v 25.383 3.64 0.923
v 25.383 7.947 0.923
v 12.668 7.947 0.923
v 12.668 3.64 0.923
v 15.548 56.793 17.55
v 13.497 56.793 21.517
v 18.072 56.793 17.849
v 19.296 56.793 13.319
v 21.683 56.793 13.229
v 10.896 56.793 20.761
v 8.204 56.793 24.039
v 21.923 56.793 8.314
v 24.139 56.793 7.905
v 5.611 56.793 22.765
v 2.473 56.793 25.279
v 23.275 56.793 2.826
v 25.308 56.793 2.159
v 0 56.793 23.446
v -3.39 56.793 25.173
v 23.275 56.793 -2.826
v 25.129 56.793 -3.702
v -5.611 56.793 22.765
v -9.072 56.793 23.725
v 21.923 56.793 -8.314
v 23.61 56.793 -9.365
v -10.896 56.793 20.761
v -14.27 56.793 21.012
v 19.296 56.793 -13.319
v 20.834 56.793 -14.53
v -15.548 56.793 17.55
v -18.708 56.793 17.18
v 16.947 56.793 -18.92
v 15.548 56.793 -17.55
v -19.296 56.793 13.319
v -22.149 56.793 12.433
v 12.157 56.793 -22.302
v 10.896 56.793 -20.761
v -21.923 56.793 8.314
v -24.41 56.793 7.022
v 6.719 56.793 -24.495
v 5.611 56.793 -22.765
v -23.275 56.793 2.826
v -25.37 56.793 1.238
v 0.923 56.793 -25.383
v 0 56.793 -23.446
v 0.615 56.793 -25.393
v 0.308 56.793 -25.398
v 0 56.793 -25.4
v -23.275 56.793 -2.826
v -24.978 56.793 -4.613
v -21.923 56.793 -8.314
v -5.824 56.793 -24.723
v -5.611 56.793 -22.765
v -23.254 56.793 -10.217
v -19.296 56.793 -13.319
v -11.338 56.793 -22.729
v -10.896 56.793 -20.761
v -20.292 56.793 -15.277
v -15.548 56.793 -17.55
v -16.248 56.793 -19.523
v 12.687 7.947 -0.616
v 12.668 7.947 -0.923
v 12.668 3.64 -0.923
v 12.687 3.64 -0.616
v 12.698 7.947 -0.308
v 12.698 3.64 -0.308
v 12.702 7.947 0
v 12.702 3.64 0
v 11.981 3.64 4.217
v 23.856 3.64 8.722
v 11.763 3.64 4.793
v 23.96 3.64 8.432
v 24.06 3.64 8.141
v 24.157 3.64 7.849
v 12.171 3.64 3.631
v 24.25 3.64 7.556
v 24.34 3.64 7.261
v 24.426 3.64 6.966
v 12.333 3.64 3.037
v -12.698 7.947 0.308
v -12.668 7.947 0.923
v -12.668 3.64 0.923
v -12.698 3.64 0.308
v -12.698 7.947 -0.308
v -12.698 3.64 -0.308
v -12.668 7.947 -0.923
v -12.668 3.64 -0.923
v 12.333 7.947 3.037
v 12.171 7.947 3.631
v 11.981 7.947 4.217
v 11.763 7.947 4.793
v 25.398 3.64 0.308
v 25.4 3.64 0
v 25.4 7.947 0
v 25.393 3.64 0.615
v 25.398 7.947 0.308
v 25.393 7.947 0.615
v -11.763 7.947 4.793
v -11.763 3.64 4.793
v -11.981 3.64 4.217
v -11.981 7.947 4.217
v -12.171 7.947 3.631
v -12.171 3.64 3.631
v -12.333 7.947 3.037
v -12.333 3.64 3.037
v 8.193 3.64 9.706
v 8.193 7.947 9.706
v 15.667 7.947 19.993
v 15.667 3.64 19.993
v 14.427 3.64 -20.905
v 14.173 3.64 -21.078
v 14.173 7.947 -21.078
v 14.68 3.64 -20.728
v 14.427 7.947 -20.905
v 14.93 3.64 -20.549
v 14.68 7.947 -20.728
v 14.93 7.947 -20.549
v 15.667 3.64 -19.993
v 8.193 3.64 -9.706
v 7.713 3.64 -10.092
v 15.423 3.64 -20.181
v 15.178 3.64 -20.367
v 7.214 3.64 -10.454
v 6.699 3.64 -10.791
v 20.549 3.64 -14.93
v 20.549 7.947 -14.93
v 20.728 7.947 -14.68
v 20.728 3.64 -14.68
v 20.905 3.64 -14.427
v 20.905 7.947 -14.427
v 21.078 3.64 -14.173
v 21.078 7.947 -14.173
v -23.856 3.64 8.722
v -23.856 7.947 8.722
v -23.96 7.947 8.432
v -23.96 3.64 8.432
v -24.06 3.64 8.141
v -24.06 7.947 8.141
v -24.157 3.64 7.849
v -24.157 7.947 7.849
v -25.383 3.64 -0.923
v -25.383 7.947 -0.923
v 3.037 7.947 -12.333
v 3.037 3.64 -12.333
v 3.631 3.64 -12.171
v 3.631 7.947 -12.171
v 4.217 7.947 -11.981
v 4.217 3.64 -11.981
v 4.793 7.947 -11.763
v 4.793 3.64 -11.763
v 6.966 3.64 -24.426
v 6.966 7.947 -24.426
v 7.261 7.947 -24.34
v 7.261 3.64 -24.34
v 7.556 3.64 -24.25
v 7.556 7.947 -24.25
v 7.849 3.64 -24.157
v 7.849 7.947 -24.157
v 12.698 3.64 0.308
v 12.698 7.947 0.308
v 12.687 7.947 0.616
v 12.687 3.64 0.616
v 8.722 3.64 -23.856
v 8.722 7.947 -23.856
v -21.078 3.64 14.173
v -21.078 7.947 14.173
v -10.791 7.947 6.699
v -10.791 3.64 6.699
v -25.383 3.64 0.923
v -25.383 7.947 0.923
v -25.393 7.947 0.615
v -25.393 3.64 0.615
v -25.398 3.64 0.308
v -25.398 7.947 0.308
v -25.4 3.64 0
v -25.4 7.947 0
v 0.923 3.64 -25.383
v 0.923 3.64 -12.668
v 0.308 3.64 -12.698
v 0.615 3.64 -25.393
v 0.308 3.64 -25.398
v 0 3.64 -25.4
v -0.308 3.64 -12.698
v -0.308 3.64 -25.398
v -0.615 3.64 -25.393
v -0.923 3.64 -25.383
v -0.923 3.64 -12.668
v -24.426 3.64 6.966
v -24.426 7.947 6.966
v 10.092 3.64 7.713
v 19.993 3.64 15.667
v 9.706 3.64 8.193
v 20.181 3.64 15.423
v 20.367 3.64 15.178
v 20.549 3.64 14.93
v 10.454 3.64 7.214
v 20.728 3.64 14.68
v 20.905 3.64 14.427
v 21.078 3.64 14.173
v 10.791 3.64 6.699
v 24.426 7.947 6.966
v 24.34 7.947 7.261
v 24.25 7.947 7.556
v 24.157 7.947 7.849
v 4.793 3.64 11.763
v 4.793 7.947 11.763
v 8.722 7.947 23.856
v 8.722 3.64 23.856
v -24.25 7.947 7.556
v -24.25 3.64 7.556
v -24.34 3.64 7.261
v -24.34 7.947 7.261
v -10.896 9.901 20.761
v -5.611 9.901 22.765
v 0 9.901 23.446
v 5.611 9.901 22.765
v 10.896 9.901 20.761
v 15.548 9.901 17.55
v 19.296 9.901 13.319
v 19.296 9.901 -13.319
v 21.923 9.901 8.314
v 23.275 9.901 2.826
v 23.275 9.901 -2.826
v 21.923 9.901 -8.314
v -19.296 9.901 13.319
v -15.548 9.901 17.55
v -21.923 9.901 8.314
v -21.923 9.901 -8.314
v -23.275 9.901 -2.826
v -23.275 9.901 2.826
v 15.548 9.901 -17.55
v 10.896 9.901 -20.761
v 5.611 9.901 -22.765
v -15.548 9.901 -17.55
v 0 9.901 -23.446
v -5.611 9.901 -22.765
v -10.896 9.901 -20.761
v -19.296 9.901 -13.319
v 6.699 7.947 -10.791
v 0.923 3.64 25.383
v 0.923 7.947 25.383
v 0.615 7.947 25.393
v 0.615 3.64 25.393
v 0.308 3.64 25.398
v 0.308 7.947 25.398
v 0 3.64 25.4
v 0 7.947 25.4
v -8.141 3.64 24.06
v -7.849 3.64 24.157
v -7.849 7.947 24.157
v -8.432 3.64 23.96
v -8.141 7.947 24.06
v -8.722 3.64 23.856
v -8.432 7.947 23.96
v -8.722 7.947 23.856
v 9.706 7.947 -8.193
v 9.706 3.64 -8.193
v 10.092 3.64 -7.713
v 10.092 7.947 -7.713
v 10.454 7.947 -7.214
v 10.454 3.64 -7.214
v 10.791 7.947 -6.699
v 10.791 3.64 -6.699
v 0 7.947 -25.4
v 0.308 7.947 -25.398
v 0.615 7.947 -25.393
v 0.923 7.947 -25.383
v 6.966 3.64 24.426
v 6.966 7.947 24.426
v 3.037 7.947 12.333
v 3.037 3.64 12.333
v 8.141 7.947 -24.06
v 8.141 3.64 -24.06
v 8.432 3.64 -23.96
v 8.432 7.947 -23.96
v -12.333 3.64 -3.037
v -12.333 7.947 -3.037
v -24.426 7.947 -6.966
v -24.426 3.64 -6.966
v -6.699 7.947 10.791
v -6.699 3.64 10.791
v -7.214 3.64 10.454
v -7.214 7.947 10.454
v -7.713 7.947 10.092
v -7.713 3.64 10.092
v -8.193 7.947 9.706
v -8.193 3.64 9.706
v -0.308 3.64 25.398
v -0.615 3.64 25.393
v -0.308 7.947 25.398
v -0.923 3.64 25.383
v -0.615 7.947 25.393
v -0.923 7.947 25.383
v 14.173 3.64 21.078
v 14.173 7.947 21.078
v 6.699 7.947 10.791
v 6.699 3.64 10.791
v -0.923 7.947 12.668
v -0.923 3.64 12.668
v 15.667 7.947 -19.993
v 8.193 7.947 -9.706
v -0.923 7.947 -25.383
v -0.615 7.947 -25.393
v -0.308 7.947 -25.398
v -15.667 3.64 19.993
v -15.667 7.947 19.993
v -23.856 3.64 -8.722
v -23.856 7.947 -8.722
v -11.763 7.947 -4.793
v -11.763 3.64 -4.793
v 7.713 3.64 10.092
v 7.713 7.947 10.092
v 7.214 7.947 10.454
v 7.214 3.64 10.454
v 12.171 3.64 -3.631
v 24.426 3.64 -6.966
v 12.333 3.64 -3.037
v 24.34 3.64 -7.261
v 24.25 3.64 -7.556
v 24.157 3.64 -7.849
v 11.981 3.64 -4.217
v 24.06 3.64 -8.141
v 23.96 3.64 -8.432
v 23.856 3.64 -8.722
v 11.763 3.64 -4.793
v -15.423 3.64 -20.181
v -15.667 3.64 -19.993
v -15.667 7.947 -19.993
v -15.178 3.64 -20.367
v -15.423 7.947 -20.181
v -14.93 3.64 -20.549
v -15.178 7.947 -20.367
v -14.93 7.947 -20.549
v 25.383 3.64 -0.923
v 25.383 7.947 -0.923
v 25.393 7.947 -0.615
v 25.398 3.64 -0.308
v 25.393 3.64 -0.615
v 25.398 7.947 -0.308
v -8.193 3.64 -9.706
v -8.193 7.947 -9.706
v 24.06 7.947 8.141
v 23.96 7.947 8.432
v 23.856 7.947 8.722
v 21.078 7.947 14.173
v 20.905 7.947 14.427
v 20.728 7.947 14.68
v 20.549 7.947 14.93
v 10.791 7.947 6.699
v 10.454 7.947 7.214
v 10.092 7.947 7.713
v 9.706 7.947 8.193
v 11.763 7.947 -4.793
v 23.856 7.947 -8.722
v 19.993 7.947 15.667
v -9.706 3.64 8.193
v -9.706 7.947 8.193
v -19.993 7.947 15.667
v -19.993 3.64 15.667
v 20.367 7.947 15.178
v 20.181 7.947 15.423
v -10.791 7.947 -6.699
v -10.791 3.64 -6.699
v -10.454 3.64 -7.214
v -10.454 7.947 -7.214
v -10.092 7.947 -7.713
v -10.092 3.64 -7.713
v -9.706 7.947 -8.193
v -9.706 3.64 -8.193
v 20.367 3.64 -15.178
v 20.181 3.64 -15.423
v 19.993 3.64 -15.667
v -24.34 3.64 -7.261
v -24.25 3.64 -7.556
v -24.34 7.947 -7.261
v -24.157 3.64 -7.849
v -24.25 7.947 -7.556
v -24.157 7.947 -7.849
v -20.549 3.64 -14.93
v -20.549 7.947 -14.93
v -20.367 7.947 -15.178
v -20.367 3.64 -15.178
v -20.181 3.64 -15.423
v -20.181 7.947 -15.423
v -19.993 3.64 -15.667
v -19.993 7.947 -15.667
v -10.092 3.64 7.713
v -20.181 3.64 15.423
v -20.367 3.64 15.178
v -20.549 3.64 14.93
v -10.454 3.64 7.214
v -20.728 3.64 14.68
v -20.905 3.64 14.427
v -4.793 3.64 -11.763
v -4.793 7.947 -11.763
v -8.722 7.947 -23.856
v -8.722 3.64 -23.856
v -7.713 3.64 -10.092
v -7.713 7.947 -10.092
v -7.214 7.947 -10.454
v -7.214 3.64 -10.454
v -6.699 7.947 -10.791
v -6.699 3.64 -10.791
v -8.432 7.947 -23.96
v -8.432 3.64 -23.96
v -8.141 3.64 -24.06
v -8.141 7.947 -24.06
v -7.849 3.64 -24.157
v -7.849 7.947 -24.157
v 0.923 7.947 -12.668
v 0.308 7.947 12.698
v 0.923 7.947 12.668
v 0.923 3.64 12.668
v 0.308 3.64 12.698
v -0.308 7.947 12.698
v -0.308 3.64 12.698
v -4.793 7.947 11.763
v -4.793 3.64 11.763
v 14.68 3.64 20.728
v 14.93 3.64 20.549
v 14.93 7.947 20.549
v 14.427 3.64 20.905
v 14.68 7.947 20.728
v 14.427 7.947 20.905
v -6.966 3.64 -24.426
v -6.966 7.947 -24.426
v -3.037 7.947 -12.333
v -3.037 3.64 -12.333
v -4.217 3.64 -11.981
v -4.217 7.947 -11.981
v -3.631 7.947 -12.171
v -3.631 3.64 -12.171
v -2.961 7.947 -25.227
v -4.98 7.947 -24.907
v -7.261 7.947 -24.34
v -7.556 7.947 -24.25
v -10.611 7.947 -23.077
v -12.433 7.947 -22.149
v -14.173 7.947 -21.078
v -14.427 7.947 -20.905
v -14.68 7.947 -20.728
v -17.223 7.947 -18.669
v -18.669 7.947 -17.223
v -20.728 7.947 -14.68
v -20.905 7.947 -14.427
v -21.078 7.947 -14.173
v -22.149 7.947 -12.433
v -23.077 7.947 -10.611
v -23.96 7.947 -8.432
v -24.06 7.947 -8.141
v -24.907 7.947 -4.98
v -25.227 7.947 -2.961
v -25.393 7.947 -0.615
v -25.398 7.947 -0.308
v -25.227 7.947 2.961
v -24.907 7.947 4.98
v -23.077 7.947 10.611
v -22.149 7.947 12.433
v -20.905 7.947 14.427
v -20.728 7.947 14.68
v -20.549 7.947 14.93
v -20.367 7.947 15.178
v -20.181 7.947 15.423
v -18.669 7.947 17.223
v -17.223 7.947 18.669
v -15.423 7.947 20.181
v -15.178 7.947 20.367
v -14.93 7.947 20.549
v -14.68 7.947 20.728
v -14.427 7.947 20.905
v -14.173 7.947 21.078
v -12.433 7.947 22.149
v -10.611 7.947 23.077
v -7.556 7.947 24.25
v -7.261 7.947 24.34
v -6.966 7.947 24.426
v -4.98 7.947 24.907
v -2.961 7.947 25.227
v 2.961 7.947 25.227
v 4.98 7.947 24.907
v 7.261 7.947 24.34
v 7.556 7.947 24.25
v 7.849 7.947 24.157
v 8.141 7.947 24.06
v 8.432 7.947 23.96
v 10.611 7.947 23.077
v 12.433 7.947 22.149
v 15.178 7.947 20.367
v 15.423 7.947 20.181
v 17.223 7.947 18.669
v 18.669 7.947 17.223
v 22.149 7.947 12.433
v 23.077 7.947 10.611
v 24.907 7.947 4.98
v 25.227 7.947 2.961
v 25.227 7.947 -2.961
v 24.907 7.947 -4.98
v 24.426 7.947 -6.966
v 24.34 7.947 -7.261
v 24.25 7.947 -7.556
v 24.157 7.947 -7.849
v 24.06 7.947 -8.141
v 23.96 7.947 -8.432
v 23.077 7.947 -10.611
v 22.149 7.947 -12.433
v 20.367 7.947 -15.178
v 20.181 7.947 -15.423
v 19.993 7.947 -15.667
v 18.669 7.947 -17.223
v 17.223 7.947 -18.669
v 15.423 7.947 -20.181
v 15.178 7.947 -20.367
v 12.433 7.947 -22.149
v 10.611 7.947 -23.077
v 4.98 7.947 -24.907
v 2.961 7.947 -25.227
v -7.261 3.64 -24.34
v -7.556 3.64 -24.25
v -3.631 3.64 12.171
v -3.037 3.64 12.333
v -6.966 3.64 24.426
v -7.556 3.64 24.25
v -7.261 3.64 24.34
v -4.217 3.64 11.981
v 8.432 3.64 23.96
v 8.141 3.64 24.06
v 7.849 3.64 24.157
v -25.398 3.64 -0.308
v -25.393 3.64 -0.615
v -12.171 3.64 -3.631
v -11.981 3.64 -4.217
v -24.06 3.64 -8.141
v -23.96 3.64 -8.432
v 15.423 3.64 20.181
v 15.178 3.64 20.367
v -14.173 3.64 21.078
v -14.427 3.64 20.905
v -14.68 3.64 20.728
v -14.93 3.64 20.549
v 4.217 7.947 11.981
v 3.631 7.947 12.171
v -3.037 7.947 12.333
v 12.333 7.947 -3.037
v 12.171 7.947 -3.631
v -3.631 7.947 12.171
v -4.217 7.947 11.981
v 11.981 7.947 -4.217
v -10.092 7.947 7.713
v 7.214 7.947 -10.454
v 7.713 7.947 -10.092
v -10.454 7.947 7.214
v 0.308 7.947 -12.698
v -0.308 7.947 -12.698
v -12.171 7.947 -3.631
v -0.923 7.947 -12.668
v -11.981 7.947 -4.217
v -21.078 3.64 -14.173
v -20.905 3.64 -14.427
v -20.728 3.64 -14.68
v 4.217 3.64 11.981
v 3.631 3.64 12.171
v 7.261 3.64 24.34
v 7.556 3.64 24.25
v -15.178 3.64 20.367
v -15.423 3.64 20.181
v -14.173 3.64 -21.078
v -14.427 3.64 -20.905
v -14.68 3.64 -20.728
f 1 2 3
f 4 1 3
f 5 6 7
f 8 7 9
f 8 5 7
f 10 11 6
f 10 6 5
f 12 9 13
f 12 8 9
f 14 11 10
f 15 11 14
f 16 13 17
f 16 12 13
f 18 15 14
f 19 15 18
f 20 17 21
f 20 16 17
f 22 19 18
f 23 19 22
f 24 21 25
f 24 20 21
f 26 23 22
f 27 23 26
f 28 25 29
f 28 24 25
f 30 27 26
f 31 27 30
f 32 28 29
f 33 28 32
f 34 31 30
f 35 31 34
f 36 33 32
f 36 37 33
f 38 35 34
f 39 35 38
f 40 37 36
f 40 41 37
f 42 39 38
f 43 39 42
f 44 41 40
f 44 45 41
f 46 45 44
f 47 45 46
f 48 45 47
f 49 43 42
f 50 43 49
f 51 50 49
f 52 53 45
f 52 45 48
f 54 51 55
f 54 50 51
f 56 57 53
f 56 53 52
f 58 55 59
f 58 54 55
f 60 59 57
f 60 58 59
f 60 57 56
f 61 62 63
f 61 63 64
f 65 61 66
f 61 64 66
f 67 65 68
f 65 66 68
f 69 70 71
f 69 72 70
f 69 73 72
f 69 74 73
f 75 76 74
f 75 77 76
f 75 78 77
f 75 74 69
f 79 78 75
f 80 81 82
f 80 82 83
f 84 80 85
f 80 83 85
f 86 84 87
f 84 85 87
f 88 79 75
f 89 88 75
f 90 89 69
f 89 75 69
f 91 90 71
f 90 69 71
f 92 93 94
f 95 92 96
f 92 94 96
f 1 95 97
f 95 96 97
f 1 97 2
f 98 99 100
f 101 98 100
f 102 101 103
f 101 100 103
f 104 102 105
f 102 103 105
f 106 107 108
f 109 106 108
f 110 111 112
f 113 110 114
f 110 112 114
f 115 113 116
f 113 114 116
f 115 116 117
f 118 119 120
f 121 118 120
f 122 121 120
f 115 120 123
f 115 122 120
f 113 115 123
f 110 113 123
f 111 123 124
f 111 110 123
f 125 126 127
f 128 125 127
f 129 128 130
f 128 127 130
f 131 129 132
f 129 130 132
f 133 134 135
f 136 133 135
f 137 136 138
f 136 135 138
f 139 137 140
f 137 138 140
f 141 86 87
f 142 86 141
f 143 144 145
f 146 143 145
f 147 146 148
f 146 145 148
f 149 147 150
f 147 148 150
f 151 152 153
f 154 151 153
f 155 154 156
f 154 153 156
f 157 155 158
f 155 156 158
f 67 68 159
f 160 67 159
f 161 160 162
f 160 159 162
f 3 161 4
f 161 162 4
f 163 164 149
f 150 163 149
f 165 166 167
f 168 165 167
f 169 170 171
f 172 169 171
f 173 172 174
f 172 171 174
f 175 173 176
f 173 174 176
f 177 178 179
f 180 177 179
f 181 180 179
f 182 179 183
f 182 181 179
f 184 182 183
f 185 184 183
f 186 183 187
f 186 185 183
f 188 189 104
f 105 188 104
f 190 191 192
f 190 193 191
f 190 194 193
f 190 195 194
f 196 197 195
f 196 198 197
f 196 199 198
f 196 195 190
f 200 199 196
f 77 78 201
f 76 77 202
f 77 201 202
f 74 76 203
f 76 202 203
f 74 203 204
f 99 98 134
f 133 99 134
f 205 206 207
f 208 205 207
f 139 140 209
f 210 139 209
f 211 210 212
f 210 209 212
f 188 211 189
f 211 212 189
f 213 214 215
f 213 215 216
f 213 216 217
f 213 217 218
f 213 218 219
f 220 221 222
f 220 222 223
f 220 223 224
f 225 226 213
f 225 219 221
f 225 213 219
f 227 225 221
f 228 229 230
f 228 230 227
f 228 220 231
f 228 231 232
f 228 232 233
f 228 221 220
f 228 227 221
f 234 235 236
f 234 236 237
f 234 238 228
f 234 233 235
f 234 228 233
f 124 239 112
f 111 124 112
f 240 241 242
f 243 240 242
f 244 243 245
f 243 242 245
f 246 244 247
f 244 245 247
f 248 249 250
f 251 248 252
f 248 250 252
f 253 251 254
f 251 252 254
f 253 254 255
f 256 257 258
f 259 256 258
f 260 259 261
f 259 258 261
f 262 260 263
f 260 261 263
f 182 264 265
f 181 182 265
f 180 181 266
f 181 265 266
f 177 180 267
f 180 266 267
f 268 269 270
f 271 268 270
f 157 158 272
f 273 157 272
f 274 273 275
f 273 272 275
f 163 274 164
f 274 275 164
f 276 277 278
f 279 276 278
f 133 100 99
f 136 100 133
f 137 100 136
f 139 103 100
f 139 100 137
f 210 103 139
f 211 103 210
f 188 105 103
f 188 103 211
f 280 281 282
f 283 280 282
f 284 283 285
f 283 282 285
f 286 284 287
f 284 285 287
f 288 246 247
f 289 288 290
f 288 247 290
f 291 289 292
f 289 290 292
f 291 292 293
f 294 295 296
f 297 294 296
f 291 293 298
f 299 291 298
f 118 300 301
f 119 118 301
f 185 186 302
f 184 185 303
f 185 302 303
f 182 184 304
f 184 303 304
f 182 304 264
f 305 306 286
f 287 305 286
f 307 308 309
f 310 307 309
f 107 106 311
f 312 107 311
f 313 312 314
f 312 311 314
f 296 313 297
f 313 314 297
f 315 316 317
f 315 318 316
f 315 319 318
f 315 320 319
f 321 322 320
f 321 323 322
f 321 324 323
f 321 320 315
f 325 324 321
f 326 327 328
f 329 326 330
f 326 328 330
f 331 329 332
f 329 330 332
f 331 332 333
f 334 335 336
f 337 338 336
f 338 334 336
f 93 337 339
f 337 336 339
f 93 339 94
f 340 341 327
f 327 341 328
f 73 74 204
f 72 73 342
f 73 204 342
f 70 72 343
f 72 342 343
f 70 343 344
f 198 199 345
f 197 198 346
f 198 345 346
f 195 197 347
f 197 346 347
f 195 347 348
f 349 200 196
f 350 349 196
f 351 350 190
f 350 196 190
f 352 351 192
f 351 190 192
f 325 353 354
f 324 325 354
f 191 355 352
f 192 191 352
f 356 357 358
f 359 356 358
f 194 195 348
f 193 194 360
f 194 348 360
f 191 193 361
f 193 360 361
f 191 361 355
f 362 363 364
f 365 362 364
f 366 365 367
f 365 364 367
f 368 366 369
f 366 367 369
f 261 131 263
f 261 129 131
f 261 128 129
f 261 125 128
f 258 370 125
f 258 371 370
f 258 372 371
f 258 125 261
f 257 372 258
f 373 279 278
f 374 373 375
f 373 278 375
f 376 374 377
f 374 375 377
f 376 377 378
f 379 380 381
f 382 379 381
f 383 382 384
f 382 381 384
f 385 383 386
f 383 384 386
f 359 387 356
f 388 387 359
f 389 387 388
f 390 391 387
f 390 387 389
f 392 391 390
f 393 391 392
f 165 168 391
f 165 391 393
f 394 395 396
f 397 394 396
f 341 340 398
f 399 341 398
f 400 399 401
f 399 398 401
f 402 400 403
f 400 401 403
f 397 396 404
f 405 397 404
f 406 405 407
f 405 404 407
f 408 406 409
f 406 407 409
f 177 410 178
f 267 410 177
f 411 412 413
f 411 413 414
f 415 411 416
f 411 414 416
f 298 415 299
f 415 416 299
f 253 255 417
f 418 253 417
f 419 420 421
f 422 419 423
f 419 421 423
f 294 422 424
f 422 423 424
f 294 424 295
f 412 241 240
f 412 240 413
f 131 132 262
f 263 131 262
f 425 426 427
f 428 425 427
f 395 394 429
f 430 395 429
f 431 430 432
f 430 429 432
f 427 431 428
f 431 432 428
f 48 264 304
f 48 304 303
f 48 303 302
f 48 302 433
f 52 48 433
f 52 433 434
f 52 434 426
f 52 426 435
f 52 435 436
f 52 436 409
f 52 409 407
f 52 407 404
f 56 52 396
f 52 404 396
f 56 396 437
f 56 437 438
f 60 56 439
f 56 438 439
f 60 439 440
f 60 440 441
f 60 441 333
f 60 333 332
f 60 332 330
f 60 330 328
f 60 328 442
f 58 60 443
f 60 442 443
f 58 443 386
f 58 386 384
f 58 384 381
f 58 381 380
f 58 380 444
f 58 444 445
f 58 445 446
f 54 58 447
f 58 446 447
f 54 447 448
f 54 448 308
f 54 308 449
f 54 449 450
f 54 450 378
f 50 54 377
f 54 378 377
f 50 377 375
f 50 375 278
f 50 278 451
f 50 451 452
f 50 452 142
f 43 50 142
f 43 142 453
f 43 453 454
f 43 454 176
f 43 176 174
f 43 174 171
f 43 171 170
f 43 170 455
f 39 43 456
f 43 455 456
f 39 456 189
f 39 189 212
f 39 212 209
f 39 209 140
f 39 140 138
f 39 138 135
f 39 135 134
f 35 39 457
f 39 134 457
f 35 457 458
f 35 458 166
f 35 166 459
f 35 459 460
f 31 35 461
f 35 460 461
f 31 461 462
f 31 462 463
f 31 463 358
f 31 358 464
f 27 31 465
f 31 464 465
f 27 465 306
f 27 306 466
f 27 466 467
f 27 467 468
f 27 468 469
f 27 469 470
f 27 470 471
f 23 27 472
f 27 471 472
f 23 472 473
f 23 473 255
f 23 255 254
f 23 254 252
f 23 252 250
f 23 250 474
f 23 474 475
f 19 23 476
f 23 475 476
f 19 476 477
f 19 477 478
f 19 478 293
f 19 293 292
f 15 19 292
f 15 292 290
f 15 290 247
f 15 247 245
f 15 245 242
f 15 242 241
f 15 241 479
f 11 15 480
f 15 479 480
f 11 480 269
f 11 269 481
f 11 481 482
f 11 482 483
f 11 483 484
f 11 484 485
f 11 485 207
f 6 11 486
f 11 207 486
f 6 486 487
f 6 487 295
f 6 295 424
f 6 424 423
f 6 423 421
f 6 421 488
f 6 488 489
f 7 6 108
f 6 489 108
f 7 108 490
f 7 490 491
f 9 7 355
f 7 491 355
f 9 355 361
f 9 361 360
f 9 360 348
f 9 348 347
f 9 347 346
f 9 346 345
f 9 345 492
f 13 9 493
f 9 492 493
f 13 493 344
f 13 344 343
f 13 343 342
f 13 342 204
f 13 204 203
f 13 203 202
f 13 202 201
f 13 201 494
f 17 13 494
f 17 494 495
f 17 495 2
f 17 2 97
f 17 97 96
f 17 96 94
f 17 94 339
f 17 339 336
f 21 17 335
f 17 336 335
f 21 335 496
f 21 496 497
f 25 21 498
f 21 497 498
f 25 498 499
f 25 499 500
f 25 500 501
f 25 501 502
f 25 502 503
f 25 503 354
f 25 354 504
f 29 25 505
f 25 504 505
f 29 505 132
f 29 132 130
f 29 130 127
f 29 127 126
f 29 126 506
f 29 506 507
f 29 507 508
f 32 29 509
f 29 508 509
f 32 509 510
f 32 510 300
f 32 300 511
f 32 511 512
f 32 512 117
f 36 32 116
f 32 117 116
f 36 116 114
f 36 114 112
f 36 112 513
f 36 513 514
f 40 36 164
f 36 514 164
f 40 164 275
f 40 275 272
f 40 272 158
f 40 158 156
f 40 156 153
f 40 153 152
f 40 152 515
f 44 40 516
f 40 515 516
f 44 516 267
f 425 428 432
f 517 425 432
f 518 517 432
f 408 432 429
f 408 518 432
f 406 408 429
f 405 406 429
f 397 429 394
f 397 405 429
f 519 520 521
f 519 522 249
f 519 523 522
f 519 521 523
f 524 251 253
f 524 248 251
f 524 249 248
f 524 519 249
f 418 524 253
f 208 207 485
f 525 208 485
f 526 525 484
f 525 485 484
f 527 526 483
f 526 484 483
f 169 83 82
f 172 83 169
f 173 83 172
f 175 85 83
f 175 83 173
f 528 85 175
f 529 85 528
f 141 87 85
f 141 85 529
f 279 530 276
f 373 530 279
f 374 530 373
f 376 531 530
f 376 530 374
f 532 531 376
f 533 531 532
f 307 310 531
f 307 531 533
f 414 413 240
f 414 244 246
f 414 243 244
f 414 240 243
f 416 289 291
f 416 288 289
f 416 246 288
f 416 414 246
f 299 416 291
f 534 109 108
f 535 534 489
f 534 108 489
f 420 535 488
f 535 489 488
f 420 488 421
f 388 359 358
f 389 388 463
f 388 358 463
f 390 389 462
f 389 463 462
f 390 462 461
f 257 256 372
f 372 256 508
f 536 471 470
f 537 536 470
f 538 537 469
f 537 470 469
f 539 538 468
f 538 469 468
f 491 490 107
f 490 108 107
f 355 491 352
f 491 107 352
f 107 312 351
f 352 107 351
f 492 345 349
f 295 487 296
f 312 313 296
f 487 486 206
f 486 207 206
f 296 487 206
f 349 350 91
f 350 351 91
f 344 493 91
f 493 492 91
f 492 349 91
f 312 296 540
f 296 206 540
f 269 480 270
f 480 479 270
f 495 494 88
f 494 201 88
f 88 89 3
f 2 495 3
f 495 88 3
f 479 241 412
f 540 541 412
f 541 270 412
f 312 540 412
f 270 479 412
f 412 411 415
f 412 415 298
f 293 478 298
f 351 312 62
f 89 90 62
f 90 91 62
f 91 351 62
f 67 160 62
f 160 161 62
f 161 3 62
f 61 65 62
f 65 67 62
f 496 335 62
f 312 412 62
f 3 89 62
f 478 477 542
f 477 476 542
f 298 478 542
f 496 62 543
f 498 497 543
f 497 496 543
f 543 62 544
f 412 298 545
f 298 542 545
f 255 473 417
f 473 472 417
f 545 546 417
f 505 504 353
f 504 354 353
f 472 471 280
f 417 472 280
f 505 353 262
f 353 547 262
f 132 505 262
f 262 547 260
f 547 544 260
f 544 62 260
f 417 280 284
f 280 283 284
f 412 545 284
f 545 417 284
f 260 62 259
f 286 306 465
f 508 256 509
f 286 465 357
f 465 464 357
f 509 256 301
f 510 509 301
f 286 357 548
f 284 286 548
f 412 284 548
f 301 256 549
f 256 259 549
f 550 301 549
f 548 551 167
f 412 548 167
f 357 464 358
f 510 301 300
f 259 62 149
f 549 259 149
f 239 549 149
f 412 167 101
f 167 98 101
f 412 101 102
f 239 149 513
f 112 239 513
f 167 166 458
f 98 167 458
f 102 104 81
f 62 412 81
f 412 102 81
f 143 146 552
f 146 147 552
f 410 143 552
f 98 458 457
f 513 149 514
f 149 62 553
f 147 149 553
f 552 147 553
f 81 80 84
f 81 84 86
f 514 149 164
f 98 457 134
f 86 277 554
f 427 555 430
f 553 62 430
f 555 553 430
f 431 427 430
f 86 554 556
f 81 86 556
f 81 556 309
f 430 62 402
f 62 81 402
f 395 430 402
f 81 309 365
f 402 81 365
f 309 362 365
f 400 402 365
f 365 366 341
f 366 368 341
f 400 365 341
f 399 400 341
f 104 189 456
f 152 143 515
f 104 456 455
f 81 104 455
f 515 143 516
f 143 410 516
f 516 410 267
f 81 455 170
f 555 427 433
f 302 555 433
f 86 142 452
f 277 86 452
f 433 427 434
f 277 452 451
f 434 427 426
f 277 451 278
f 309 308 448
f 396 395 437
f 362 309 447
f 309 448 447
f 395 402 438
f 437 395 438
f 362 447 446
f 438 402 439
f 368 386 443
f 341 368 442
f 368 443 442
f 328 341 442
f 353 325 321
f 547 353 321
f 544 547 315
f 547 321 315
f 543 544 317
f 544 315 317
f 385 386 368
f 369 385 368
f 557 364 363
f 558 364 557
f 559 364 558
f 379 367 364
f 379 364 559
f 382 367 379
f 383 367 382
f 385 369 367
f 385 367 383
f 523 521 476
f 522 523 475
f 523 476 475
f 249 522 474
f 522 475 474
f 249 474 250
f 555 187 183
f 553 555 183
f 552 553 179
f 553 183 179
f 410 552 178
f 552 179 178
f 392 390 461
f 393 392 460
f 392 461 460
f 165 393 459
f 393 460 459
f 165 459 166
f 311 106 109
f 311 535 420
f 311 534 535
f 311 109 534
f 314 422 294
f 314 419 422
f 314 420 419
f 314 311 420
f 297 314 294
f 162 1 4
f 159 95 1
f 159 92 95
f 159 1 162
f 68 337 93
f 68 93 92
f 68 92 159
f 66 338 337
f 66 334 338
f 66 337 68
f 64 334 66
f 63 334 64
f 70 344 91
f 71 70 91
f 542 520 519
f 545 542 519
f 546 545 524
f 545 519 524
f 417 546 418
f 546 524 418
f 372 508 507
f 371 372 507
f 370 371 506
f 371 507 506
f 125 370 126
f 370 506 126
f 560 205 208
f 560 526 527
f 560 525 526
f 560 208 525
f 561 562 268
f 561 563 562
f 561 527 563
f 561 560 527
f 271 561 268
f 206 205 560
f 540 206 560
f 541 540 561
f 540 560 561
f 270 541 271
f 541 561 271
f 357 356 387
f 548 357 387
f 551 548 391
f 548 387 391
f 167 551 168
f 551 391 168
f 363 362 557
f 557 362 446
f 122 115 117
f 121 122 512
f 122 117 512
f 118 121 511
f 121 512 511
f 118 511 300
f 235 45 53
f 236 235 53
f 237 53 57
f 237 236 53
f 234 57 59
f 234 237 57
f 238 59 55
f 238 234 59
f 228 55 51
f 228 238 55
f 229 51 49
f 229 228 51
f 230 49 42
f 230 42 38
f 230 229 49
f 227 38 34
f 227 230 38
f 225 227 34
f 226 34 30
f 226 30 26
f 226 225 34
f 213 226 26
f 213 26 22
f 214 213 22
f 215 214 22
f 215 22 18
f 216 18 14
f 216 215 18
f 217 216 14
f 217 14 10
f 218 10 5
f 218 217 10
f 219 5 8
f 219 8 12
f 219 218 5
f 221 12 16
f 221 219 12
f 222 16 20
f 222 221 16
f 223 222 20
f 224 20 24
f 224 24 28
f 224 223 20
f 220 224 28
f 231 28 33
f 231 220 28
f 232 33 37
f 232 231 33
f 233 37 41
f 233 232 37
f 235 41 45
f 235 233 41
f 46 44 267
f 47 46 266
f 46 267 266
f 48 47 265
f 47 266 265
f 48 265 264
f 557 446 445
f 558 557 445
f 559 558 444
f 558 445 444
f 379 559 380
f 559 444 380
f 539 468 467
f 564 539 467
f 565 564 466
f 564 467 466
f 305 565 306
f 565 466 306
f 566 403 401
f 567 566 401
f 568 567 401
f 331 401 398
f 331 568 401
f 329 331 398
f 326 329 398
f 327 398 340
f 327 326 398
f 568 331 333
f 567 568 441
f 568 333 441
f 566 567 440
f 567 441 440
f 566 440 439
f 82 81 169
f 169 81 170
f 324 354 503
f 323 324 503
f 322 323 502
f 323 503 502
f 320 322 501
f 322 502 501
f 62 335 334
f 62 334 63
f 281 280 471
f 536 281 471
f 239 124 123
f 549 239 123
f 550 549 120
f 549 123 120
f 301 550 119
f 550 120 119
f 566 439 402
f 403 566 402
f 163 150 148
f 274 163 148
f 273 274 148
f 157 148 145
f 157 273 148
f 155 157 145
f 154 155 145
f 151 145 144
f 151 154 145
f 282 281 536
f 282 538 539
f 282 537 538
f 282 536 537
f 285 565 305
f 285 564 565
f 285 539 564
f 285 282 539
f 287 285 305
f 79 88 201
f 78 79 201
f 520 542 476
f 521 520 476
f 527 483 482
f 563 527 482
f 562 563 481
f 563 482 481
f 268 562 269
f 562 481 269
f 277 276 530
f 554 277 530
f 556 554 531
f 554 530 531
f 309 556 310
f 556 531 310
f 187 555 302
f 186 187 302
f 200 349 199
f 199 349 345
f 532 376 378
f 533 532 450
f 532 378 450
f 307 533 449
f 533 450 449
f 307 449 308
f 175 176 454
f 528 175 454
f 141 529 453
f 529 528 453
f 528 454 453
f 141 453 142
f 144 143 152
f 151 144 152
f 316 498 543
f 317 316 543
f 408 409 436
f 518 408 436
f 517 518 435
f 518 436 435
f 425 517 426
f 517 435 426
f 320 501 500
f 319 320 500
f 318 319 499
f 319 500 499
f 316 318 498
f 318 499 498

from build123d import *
from build123d.topology import SkipClean

# Parameters (mm, degrees)
SKETCH1_R               = 38.1
BOSS_EXTRUDE1_DEPTH     = 76.2
SHELL2_T                = 3.175
SKETCH2_W               = 3
SKETCH2_H               = 82.55
SKETCH2_W_2             = 82.55
SKETCH2_H_2             = 3
BOSS_EXTRUDE2_DEPTH     = 7
CUT_EXTRUDE1_DEPTH      = 99.527366122
CUT_EXTRUDE1_DEPTH_BACK = 99.527366122
SKETCH3_R               = 61.906276858
SKETCH3_R_2             = 41.275
SKETCH4_R               = 20.64
CUT_EXTRUDE2_DEPTH      = 7
SCALE1_SCALE            = 0.615384615


with BuildPart() as part:
    # Sketch1 → Boss-Extrude1 (new body)
    with BuildSketch(Plane(origin=(0, 0, 0), x_dir=(1, 0, 0), z_dir=(0, 1, 0))):
        with Locations(Location((0, 0, 0), (0, 0, 90))):
            Circle(SKETCH1_R)
    extrude(amount=BOSS_EXTRUDE1_DEPTH)

    # Shell2
    shell2_openings = [part.faces().sort_by_distance(p)[0] for p in [
        (0, 76.2, 0),
    ]]
    offset(amount=SHELL2_T, openings=shell2_openings, kind=Kind.INTERSECTION)

    # Sketch2 → Boss-Extrude2 (add)
    with BuildSketch(Plane(origin=(0, -3.175, 0), x_dir=(-1, 0, 0), z_dir=(0, -1, 0))):
        Rectangle(SKETCH2_W, SKETCH2_H)
        Polygon((-23.047310797, -34.273854321), (25.47436178, 32.510498564), (23.047310797, 34.273854321), (-25.47436178, -32.510498564), align=None)
        Polygon((-38.791332219, -14.181261217), (39.718383202, 11.328091668), (38.791332219, 14.181261217), (-39.718383202, -11.328091668), align=None)
        Polygon((-39.718383202, 11.328091668), (38.791332219, -14.181261217), (39.718383202, -11.328091668), (-38.791332219, 14.181261217), align=None)
        Polygon((-25.47436178, 32.510498564), (23.047310797, -34.273854321), (25.47436178, -32.510498564), (-23.047310797, 34.273854321), align=None)
        Polygon((-14.181261217, 38.791332219), (11.328091668, -39.718383202), (14.181261217, -38.791332219), (-11.328091668, 39.718383202), align=None)
        Polygon((11.328091668, 39.718383202), (-14.181261217, -38.791332219), (-11.328091668, -39.718383202), (14.181261217, 38.791332219), align=None)
        Polygon((32.510498564, 25.47436178), (-34.273854321, -23.047310797), (-32.510498564, -25.47436178), (34.273854321, 23.047310797), align=None)
        Rectangle(SKETCH2_W_2, SKETCH2_H_2)
        Polygon((-34.273854321, 23.047310797), (32.510498564, -25.47436178), (34.273854321, -23.047310797), (-32.510498564, 25.47436178), align=None)
    extrude(amount=BOSS_EXTRUDE2_DEPTH)

    # Sketch3 → Cut-Extrude1 (cut, two sides: drawn at the far end of the back side and taken through both)
    with SkipClean():  # the faces are left unmerged after this step: merging them gives an invalid solid
        with BuildSketch(Plane.XZ.offset(3.175).offset(-CUT_EXTRUDE1_DEPTH_BACK)):
            Circle(SKETCH3_R)
            with Locations(Location((0, 0, 0), (0, 0, 272.082679548))):
                Circle(SKETCH3_R_2, mode=Mode.SUBTRACT)
        extrude(amount=CUT_EXTRUDE1_DEPTH + CUT_EXTRUDE1_DEPTH_BACK, mode=Mode.SUBTRACT)

    # Sketch4 → Cut-Extrude2 (cut)
    with SkipClean():  # the faces are left unmerged after this step: merging them gives an invalid solid
        with BuildSketch(Plane.XZ.offset(10.175)):
            Circle(SKETCH4_R)
        extrude(amount=-CUT_EXTRUDE2_DEPTH, mode=Mode.SUBTRACT)


with BuildPart() as part_1:
    # Scale1: scaled about (0, 25.742888467, 0)
    add(part.part.scale(SCALE1_SCALE).moved(Location((0, 9.901110949, 0))))


solid = part_1.part
